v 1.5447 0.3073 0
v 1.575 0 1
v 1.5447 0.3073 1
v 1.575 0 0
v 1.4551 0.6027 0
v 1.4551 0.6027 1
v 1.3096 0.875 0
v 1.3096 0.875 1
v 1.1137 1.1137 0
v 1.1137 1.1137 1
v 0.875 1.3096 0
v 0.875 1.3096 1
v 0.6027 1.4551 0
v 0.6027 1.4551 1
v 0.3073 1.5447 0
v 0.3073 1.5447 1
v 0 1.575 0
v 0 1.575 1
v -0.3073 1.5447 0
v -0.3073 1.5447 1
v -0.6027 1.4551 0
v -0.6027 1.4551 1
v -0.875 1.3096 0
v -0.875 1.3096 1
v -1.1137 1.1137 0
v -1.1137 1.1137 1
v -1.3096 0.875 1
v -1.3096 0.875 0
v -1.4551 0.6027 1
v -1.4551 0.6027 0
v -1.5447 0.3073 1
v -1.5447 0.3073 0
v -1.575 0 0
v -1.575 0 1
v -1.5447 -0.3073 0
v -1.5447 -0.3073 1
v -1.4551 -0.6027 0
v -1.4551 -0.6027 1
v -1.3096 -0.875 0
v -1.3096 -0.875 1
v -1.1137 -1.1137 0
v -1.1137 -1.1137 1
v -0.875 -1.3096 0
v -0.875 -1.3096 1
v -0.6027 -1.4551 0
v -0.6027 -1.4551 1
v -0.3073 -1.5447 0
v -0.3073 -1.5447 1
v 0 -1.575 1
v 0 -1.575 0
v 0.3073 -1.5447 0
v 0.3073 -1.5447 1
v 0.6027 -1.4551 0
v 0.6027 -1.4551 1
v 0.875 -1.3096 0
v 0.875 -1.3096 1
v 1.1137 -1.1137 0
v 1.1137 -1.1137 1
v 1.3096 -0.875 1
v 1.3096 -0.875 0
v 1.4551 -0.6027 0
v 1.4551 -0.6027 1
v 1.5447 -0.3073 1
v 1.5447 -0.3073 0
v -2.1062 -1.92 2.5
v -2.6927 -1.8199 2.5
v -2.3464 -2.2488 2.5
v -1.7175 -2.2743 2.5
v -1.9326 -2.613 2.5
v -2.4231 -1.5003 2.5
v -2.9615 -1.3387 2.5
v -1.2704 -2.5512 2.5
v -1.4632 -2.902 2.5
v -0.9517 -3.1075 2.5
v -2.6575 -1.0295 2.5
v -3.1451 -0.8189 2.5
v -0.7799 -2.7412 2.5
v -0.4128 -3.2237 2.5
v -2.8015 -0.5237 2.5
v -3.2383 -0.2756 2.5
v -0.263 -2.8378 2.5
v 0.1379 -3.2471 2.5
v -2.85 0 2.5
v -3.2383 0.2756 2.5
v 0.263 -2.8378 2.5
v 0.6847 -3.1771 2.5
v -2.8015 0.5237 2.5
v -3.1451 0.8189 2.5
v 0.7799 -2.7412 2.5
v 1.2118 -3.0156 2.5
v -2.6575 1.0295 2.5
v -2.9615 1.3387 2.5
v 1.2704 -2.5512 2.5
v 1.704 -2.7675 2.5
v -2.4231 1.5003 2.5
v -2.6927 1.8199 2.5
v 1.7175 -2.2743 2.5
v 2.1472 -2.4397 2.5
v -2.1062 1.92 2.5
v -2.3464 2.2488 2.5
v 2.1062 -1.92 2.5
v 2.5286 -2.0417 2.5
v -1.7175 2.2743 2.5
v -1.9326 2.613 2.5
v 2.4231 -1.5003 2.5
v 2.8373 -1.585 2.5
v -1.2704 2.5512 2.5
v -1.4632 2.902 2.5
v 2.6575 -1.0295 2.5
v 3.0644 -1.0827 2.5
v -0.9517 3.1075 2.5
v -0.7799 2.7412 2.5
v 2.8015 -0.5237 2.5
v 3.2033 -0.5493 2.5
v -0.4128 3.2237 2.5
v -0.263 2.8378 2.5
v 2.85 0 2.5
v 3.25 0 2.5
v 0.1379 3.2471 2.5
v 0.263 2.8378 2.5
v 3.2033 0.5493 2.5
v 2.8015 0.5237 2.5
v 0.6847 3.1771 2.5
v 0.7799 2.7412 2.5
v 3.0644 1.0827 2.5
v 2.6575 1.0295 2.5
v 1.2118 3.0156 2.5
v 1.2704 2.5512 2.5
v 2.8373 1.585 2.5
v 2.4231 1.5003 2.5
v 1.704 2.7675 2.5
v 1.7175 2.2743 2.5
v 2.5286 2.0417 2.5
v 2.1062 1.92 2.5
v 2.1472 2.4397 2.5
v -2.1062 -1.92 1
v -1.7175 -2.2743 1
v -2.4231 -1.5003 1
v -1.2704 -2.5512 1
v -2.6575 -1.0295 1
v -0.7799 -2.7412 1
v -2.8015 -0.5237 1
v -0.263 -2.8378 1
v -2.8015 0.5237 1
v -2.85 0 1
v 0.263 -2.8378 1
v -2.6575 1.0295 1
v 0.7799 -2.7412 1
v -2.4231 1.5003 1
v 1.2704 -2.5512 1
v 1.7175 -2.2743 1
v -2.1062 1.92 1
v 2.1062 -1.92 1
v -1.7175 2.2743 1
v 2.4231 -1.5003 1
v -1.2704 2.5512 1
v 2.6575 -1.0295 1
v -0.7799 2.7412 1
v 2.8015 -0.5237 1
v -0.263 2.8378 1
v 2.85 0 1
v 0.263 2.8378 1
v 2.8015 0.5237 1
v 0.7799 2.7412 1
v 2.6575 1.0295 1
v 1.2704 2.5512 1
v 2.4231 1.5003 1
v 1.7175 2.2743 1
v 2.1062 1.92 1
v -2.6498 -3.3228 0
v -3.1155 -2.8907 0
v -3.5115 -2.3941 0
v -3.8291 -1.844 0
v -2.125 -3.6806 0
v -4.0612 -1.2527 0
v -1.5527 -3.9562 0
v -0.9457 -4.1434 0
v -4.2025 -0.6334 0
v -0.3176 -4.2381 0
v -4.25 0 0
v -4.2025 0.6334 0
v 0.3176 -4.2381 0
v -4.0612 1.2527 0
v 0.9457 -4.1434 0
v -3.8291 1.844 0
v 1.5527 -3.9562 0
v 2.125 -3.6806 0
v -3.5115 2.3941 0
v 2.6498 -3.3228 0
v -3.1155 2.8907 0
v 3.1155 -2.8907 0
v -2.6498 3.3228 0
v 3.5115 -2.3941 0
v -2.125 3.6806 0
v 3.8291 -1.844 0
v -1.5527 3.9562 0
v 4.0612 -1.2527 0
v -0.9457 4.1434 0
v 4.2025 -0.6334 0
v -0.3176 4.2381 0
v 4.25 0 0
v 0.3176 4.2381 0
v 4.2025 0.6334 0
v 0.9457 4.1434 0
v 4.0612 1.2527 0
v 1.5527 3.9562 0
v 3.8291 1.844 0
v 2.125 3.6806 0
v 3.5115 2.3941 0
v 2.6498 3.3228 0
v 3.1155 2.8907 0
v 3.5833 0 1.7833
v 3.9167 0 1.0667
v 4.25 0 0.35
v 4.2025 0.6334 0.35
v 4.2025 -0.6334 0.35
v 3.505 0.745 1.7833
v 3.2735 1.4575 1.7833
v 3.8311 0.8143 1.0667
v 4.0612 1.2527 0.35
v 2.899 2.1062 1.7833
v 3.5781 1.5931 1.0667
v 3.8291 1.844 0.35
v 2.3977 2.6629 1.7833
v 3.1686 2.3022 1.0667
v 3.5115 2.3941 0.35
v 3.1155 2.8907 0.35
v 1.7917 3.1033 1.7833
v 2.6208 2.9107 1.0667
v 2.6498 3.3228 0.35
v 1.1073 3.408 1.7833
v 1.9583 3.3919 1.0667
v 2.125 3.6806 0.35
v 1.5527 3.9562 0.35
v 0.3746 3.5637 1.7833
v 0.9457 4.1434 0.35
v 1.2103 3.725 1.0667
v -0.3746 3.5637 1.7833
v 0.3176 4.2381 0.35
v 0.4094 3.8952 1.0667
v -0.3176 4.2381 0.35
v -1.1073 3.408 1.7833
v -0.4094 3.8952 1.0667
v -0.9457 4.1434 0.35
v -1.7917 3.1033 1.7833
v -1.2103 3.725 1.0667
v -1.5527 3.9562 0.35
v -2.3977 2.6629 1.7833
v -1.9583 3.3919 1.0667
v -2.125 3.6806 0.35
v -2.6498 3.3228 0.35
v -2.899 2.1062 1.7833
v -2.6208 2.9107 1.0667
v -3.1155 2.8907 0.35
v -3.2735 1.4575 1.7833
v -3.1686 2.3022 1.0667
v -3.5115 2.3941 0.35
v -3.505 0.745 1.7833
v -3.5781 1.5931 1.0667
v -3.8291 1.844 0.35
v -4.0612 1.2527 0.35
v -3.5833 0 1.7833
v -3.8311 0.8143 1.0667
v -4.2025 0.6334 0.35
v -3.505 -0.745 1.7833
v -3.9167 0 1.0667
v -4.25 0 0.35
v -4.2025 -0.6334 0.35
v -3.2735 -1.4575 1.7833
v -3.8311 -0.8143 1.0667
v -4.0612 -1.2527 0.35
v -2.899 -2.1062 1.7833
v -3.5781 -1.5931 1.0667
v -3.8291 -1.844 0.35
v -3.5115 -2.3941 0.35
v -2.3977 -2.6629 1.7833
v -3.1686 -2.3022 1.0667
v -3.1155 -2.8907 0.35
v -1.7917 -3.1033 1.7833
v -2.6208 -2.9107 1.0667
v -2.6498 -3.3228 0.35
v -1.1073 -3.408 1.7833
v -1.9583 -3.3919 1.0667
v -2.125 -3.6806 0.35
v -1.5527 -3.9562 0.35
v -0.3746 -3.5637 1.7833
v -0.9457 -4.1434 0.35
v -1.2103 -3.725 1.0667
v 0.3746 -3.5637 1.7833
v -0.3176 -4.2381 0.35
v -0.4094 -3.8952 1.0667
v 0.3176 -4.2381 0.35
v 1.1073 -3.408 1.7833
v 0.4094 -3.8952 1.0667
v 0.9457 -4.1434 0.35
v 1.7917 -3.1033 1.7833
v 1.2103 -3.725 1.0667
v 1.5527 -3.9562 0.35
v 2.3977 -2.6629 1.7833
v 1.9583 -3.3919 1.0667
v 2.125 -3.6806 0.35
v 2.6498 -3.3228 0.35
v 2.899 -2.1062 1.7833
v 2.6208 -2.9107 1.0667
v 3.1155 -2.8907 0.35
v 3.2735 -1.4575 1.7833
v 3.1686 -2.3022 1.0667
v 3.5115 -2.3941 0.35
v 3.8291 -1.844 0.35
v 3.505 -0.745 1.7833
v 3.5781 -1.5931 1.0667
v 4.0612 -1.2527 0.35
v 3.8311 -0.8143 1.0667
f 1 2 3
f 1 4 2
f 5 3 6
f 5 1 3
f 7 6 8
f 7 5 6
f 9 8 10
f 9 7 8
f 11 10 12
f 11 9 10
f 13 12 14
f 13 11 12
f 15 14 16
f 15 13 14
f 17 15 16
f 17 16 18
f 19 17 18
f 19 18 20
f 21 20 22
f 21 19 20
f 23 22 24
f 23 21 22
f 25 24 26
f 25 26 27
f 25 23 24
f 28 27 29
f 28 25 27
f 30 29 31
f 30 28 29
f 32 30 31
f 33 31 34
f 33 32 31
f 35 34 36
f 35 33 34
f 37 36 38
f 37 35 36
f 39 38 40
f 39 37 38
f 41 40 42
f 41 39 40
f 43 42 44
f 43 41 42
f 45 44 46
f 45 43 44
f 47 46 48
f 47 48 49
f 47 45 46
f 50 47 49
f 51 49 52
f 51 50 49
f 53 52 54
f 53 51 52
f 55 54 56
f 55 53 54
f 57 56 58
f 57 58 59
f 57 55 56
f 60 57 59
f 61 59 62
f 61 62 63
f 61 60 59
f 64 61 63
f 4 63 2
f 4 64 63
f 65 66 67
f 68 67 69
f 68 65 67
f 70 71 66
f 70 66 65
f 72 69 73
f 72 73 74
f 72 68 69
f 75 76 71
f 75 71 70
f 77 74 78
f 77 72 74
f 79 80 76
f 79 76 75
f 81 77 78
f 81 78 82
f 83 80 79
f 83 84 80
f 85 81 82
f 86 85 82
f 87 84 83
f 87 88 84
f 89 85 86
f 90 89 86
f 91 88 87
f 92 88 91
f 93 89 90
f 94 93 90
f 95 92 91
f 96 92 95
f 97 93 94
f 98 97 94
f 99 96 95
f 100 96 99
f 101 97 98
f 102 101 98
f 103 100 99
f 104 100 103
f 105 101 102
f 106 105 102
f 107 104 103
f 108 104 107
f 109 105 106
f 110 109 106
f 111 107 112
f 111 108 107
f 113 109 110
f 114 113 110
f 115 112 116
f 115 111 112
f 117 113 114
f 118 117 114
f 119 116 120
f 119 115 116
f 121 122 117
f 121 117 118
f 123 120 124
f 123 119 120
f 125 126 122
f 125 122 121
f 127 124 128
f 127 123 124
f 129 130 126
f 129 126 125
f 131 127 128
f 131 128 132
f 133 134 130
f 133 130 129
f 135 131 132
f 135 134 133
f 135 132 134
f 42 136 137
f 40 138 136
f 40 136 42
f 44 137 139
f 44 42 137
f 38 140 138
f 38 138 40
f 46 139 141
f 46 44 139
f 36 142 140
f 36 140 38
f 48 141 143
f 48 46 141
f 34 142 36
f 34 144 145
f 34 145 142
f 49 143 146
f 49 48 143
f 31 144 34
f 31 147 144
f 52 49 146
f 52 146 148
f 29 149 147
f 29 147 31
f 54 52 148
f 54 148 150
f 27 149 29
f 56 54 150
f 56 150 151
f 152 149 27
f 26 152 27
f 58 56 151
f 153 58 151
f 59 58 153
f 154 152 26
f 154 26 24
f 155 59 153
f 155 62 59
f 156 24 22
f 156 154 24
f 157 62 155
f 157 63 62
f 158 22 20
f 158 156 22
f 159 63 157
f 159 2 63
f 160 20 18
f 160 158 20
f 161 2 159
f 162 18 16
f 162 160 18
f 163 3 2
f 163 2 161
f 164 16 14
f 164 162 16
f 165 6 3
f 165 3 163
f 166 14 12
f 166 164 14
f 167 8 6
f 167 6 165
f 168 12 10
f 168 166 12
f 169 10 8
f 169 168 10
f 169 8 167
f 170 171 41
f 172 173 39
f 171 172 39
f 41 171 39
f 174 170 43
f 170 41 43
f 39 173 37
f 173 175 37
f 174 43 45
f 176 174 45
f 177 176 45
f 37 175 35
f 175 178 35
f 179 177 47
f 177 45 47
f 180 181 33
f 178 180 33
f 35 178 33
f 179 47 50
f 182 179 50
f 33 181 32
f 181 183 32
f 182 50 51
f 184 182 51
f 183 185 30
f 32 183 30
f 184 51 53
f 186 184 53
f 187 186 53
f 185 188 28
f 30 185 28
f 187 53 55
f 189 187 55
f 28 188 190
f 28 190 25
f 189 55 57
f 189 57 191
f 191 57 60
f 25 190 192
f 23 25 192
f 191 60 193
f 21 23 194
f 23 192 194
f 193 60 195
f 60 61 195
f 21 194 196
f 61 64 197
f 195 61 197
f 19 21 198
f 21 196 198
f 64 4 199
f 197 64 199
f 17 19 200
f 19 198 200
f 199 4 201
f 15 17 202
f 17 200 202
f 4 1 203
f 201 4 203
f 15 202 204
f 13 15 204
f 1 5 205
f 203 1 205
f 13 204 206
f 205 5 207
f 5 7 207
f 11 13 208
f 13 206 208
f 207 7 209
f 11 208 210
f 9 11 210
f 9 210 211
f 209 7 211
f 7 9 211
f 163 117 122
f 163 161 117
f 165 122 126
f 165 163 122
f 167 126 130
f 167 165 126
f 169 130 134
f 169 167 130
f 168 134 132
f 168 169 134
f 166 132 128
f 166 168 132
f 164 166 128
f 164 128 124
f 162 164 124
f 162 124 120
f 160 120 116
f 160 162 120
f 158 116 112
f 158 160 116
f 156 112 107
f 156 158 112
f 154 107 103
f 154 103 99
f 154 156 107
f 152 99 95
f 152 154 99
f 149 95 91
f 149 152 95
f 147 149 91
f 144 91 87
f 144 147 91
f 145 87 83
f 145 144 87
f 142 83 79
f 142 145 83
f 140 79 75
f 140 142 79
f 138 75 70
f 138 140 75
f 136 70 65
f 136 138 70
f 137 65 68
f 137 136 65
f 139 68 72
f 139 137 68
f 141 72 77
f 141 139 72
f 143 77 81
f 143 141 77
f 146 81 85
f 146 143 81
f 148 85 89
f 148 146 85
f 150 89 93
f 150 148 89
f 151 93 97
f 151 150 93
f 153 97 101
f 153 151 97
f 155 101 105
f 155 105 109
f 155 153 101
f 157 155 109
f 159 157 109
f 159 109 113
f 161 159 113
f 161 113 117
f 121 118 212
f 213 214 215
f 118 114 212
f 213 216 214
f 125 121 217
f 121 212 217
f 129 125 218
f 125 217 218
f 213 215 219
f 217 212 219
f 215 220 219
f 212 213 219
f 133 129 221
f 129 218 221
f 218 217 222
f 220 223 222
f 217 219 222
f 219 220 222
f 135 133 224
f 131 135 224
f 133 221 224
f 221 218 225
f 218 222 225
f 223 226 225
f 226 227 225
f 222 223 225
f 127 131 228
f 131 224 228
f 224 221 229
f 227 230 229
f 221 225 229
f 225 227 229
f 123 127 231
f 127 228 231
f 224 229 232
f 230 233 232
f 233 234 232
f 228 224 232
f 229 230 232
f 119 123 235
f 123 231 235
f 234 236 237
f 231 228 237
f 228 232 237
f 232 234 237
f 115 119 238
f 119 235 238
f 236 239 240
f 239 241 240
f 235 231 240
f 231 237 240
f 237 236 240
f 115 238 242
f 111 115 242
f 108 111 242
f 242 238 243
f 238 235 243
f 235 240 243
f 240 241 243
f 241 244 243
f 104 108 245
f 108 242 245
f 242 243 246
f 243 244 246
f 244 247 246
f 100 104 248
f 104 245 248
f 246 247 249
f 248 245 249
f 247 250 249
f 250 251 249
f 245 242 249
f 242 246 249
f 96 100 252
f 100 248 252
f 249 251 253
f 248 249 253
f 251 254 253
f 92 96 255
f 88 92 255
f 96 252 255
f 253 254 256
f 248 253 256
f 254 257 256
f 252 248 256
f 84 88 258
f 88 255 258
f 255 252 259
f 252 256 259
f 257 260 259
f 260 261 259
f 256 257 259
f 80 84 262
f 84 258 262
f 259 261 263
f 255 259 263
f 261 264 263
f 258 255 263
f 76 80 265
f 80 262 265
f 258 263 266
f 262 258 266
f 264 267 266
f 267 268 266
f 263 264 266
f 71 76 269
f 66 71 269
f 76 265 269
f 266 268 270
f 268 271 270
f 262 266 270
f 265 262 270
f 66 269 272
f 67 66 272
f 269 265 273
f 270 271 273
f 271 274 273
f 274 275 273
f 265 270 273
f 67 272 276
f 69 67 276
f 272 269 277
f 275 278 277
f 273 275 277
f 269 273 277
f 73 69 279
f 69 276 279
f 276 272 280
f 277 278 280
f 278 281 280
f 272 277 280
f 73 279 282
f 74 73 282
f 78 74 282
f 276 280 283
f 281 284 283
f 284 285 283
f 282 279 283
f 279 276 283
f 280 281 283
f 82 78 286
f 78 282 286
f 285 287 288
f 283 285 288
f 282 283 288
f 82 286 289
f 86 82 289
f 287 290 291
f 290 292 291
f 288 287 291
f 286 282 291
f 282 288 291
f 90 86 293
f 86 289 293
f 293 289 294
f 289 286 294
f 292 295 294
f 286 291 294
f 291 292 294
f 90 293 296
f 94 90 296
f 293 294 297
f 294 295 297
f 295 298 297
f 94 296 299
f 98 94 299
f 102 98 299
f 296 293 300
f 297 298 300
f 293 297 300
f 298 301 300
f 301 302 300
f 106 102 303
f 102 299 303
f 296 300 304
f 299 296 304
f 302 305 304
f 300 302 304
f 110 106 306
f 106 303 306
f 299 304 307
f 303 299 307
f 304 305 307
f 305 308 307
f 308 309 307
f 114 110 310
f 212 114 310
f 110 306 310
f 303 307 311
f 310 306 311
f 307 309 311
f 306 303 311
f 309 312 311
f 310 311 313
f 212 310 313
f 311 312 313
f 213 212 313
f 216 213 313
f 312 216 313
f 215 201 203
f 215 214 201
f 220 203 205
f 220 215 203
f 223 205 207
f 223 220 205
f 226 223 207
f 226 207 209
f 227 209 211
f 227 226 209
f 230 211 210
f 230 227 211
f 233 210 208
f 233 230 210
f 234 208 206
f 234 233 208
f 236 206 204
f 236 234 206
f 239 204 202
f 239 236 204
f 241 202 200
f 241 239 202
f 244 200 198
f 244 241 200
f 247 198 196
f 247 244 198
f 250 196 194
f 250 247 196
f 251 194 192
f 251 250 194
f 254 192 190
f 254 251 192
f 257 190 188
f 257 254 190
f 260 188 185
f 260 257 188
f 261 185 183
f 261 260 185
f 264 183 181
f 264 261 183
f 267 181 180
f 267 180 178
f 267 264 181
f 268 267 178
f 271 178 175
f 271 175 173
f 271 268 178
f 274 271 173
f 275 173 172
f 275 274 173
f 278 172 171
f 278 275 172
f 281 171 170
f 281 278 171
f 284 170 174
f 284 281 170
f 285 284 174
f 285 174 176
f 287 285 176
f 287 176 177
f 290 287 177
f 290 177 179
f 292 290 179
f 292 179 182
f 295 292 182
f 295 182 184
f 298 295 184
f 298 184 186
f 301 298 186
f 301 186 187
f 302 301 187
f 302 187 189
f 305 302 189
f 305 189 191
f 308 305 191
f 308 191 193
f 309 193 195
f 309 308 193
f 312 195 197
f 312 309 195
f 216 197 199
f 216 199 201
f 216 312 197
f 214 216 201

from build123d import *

# Parameters (mm, degrees)
F7_R  = 4.25
F8_R  = 4.25
F10_R = 3.25
F9_R  = 2.85
F11_R = 2.85
F13_R = 1.575
F12_R = 1.575


with BuildPart() as f14:
    # F7 (on Top) → F14 section 0
    with BuildSketch(Plane.XY):
        Circle(F7_R)
    # F8 (on offset) → F14 section 1
    with BuildSketch(Plane.XY.offset(0.35)):
        Circle(F8_R)
    loft()

    # F10 (on offset) → F15 section 0
    with BuildSketch(Plane.XY.offset(2.5)):
        Circle(F10_R)
    # F8 (on offset) → F15 section 1
    with BuildSketch(Plane.XY.offset(0.35)):
        Circle(F8_R)
    loft()

    # F9 (on offset) → F16 section 0
    with BuildSketch(Plane.XY.offset(2.5)):
        Circle(F9_R)
    # F11 (on offset) → F16 section 1
    with BuildSketch(Plane.XY.offset(1)):
        Circle(F11_R)
    loft(mode=Mode.SUBTRACT)

    # F13 (on offset) → F17 section 0
    with BuildSketch(Plane.XY.offset(1)):
        Circle(F13_R)
    # F12 (on Top) → F17 section 1
    with BuildSketch(Plane.XY):
        Circle(F12_R)
    loft(mode=Mode.SUBTRACT)


solid = f14.part
